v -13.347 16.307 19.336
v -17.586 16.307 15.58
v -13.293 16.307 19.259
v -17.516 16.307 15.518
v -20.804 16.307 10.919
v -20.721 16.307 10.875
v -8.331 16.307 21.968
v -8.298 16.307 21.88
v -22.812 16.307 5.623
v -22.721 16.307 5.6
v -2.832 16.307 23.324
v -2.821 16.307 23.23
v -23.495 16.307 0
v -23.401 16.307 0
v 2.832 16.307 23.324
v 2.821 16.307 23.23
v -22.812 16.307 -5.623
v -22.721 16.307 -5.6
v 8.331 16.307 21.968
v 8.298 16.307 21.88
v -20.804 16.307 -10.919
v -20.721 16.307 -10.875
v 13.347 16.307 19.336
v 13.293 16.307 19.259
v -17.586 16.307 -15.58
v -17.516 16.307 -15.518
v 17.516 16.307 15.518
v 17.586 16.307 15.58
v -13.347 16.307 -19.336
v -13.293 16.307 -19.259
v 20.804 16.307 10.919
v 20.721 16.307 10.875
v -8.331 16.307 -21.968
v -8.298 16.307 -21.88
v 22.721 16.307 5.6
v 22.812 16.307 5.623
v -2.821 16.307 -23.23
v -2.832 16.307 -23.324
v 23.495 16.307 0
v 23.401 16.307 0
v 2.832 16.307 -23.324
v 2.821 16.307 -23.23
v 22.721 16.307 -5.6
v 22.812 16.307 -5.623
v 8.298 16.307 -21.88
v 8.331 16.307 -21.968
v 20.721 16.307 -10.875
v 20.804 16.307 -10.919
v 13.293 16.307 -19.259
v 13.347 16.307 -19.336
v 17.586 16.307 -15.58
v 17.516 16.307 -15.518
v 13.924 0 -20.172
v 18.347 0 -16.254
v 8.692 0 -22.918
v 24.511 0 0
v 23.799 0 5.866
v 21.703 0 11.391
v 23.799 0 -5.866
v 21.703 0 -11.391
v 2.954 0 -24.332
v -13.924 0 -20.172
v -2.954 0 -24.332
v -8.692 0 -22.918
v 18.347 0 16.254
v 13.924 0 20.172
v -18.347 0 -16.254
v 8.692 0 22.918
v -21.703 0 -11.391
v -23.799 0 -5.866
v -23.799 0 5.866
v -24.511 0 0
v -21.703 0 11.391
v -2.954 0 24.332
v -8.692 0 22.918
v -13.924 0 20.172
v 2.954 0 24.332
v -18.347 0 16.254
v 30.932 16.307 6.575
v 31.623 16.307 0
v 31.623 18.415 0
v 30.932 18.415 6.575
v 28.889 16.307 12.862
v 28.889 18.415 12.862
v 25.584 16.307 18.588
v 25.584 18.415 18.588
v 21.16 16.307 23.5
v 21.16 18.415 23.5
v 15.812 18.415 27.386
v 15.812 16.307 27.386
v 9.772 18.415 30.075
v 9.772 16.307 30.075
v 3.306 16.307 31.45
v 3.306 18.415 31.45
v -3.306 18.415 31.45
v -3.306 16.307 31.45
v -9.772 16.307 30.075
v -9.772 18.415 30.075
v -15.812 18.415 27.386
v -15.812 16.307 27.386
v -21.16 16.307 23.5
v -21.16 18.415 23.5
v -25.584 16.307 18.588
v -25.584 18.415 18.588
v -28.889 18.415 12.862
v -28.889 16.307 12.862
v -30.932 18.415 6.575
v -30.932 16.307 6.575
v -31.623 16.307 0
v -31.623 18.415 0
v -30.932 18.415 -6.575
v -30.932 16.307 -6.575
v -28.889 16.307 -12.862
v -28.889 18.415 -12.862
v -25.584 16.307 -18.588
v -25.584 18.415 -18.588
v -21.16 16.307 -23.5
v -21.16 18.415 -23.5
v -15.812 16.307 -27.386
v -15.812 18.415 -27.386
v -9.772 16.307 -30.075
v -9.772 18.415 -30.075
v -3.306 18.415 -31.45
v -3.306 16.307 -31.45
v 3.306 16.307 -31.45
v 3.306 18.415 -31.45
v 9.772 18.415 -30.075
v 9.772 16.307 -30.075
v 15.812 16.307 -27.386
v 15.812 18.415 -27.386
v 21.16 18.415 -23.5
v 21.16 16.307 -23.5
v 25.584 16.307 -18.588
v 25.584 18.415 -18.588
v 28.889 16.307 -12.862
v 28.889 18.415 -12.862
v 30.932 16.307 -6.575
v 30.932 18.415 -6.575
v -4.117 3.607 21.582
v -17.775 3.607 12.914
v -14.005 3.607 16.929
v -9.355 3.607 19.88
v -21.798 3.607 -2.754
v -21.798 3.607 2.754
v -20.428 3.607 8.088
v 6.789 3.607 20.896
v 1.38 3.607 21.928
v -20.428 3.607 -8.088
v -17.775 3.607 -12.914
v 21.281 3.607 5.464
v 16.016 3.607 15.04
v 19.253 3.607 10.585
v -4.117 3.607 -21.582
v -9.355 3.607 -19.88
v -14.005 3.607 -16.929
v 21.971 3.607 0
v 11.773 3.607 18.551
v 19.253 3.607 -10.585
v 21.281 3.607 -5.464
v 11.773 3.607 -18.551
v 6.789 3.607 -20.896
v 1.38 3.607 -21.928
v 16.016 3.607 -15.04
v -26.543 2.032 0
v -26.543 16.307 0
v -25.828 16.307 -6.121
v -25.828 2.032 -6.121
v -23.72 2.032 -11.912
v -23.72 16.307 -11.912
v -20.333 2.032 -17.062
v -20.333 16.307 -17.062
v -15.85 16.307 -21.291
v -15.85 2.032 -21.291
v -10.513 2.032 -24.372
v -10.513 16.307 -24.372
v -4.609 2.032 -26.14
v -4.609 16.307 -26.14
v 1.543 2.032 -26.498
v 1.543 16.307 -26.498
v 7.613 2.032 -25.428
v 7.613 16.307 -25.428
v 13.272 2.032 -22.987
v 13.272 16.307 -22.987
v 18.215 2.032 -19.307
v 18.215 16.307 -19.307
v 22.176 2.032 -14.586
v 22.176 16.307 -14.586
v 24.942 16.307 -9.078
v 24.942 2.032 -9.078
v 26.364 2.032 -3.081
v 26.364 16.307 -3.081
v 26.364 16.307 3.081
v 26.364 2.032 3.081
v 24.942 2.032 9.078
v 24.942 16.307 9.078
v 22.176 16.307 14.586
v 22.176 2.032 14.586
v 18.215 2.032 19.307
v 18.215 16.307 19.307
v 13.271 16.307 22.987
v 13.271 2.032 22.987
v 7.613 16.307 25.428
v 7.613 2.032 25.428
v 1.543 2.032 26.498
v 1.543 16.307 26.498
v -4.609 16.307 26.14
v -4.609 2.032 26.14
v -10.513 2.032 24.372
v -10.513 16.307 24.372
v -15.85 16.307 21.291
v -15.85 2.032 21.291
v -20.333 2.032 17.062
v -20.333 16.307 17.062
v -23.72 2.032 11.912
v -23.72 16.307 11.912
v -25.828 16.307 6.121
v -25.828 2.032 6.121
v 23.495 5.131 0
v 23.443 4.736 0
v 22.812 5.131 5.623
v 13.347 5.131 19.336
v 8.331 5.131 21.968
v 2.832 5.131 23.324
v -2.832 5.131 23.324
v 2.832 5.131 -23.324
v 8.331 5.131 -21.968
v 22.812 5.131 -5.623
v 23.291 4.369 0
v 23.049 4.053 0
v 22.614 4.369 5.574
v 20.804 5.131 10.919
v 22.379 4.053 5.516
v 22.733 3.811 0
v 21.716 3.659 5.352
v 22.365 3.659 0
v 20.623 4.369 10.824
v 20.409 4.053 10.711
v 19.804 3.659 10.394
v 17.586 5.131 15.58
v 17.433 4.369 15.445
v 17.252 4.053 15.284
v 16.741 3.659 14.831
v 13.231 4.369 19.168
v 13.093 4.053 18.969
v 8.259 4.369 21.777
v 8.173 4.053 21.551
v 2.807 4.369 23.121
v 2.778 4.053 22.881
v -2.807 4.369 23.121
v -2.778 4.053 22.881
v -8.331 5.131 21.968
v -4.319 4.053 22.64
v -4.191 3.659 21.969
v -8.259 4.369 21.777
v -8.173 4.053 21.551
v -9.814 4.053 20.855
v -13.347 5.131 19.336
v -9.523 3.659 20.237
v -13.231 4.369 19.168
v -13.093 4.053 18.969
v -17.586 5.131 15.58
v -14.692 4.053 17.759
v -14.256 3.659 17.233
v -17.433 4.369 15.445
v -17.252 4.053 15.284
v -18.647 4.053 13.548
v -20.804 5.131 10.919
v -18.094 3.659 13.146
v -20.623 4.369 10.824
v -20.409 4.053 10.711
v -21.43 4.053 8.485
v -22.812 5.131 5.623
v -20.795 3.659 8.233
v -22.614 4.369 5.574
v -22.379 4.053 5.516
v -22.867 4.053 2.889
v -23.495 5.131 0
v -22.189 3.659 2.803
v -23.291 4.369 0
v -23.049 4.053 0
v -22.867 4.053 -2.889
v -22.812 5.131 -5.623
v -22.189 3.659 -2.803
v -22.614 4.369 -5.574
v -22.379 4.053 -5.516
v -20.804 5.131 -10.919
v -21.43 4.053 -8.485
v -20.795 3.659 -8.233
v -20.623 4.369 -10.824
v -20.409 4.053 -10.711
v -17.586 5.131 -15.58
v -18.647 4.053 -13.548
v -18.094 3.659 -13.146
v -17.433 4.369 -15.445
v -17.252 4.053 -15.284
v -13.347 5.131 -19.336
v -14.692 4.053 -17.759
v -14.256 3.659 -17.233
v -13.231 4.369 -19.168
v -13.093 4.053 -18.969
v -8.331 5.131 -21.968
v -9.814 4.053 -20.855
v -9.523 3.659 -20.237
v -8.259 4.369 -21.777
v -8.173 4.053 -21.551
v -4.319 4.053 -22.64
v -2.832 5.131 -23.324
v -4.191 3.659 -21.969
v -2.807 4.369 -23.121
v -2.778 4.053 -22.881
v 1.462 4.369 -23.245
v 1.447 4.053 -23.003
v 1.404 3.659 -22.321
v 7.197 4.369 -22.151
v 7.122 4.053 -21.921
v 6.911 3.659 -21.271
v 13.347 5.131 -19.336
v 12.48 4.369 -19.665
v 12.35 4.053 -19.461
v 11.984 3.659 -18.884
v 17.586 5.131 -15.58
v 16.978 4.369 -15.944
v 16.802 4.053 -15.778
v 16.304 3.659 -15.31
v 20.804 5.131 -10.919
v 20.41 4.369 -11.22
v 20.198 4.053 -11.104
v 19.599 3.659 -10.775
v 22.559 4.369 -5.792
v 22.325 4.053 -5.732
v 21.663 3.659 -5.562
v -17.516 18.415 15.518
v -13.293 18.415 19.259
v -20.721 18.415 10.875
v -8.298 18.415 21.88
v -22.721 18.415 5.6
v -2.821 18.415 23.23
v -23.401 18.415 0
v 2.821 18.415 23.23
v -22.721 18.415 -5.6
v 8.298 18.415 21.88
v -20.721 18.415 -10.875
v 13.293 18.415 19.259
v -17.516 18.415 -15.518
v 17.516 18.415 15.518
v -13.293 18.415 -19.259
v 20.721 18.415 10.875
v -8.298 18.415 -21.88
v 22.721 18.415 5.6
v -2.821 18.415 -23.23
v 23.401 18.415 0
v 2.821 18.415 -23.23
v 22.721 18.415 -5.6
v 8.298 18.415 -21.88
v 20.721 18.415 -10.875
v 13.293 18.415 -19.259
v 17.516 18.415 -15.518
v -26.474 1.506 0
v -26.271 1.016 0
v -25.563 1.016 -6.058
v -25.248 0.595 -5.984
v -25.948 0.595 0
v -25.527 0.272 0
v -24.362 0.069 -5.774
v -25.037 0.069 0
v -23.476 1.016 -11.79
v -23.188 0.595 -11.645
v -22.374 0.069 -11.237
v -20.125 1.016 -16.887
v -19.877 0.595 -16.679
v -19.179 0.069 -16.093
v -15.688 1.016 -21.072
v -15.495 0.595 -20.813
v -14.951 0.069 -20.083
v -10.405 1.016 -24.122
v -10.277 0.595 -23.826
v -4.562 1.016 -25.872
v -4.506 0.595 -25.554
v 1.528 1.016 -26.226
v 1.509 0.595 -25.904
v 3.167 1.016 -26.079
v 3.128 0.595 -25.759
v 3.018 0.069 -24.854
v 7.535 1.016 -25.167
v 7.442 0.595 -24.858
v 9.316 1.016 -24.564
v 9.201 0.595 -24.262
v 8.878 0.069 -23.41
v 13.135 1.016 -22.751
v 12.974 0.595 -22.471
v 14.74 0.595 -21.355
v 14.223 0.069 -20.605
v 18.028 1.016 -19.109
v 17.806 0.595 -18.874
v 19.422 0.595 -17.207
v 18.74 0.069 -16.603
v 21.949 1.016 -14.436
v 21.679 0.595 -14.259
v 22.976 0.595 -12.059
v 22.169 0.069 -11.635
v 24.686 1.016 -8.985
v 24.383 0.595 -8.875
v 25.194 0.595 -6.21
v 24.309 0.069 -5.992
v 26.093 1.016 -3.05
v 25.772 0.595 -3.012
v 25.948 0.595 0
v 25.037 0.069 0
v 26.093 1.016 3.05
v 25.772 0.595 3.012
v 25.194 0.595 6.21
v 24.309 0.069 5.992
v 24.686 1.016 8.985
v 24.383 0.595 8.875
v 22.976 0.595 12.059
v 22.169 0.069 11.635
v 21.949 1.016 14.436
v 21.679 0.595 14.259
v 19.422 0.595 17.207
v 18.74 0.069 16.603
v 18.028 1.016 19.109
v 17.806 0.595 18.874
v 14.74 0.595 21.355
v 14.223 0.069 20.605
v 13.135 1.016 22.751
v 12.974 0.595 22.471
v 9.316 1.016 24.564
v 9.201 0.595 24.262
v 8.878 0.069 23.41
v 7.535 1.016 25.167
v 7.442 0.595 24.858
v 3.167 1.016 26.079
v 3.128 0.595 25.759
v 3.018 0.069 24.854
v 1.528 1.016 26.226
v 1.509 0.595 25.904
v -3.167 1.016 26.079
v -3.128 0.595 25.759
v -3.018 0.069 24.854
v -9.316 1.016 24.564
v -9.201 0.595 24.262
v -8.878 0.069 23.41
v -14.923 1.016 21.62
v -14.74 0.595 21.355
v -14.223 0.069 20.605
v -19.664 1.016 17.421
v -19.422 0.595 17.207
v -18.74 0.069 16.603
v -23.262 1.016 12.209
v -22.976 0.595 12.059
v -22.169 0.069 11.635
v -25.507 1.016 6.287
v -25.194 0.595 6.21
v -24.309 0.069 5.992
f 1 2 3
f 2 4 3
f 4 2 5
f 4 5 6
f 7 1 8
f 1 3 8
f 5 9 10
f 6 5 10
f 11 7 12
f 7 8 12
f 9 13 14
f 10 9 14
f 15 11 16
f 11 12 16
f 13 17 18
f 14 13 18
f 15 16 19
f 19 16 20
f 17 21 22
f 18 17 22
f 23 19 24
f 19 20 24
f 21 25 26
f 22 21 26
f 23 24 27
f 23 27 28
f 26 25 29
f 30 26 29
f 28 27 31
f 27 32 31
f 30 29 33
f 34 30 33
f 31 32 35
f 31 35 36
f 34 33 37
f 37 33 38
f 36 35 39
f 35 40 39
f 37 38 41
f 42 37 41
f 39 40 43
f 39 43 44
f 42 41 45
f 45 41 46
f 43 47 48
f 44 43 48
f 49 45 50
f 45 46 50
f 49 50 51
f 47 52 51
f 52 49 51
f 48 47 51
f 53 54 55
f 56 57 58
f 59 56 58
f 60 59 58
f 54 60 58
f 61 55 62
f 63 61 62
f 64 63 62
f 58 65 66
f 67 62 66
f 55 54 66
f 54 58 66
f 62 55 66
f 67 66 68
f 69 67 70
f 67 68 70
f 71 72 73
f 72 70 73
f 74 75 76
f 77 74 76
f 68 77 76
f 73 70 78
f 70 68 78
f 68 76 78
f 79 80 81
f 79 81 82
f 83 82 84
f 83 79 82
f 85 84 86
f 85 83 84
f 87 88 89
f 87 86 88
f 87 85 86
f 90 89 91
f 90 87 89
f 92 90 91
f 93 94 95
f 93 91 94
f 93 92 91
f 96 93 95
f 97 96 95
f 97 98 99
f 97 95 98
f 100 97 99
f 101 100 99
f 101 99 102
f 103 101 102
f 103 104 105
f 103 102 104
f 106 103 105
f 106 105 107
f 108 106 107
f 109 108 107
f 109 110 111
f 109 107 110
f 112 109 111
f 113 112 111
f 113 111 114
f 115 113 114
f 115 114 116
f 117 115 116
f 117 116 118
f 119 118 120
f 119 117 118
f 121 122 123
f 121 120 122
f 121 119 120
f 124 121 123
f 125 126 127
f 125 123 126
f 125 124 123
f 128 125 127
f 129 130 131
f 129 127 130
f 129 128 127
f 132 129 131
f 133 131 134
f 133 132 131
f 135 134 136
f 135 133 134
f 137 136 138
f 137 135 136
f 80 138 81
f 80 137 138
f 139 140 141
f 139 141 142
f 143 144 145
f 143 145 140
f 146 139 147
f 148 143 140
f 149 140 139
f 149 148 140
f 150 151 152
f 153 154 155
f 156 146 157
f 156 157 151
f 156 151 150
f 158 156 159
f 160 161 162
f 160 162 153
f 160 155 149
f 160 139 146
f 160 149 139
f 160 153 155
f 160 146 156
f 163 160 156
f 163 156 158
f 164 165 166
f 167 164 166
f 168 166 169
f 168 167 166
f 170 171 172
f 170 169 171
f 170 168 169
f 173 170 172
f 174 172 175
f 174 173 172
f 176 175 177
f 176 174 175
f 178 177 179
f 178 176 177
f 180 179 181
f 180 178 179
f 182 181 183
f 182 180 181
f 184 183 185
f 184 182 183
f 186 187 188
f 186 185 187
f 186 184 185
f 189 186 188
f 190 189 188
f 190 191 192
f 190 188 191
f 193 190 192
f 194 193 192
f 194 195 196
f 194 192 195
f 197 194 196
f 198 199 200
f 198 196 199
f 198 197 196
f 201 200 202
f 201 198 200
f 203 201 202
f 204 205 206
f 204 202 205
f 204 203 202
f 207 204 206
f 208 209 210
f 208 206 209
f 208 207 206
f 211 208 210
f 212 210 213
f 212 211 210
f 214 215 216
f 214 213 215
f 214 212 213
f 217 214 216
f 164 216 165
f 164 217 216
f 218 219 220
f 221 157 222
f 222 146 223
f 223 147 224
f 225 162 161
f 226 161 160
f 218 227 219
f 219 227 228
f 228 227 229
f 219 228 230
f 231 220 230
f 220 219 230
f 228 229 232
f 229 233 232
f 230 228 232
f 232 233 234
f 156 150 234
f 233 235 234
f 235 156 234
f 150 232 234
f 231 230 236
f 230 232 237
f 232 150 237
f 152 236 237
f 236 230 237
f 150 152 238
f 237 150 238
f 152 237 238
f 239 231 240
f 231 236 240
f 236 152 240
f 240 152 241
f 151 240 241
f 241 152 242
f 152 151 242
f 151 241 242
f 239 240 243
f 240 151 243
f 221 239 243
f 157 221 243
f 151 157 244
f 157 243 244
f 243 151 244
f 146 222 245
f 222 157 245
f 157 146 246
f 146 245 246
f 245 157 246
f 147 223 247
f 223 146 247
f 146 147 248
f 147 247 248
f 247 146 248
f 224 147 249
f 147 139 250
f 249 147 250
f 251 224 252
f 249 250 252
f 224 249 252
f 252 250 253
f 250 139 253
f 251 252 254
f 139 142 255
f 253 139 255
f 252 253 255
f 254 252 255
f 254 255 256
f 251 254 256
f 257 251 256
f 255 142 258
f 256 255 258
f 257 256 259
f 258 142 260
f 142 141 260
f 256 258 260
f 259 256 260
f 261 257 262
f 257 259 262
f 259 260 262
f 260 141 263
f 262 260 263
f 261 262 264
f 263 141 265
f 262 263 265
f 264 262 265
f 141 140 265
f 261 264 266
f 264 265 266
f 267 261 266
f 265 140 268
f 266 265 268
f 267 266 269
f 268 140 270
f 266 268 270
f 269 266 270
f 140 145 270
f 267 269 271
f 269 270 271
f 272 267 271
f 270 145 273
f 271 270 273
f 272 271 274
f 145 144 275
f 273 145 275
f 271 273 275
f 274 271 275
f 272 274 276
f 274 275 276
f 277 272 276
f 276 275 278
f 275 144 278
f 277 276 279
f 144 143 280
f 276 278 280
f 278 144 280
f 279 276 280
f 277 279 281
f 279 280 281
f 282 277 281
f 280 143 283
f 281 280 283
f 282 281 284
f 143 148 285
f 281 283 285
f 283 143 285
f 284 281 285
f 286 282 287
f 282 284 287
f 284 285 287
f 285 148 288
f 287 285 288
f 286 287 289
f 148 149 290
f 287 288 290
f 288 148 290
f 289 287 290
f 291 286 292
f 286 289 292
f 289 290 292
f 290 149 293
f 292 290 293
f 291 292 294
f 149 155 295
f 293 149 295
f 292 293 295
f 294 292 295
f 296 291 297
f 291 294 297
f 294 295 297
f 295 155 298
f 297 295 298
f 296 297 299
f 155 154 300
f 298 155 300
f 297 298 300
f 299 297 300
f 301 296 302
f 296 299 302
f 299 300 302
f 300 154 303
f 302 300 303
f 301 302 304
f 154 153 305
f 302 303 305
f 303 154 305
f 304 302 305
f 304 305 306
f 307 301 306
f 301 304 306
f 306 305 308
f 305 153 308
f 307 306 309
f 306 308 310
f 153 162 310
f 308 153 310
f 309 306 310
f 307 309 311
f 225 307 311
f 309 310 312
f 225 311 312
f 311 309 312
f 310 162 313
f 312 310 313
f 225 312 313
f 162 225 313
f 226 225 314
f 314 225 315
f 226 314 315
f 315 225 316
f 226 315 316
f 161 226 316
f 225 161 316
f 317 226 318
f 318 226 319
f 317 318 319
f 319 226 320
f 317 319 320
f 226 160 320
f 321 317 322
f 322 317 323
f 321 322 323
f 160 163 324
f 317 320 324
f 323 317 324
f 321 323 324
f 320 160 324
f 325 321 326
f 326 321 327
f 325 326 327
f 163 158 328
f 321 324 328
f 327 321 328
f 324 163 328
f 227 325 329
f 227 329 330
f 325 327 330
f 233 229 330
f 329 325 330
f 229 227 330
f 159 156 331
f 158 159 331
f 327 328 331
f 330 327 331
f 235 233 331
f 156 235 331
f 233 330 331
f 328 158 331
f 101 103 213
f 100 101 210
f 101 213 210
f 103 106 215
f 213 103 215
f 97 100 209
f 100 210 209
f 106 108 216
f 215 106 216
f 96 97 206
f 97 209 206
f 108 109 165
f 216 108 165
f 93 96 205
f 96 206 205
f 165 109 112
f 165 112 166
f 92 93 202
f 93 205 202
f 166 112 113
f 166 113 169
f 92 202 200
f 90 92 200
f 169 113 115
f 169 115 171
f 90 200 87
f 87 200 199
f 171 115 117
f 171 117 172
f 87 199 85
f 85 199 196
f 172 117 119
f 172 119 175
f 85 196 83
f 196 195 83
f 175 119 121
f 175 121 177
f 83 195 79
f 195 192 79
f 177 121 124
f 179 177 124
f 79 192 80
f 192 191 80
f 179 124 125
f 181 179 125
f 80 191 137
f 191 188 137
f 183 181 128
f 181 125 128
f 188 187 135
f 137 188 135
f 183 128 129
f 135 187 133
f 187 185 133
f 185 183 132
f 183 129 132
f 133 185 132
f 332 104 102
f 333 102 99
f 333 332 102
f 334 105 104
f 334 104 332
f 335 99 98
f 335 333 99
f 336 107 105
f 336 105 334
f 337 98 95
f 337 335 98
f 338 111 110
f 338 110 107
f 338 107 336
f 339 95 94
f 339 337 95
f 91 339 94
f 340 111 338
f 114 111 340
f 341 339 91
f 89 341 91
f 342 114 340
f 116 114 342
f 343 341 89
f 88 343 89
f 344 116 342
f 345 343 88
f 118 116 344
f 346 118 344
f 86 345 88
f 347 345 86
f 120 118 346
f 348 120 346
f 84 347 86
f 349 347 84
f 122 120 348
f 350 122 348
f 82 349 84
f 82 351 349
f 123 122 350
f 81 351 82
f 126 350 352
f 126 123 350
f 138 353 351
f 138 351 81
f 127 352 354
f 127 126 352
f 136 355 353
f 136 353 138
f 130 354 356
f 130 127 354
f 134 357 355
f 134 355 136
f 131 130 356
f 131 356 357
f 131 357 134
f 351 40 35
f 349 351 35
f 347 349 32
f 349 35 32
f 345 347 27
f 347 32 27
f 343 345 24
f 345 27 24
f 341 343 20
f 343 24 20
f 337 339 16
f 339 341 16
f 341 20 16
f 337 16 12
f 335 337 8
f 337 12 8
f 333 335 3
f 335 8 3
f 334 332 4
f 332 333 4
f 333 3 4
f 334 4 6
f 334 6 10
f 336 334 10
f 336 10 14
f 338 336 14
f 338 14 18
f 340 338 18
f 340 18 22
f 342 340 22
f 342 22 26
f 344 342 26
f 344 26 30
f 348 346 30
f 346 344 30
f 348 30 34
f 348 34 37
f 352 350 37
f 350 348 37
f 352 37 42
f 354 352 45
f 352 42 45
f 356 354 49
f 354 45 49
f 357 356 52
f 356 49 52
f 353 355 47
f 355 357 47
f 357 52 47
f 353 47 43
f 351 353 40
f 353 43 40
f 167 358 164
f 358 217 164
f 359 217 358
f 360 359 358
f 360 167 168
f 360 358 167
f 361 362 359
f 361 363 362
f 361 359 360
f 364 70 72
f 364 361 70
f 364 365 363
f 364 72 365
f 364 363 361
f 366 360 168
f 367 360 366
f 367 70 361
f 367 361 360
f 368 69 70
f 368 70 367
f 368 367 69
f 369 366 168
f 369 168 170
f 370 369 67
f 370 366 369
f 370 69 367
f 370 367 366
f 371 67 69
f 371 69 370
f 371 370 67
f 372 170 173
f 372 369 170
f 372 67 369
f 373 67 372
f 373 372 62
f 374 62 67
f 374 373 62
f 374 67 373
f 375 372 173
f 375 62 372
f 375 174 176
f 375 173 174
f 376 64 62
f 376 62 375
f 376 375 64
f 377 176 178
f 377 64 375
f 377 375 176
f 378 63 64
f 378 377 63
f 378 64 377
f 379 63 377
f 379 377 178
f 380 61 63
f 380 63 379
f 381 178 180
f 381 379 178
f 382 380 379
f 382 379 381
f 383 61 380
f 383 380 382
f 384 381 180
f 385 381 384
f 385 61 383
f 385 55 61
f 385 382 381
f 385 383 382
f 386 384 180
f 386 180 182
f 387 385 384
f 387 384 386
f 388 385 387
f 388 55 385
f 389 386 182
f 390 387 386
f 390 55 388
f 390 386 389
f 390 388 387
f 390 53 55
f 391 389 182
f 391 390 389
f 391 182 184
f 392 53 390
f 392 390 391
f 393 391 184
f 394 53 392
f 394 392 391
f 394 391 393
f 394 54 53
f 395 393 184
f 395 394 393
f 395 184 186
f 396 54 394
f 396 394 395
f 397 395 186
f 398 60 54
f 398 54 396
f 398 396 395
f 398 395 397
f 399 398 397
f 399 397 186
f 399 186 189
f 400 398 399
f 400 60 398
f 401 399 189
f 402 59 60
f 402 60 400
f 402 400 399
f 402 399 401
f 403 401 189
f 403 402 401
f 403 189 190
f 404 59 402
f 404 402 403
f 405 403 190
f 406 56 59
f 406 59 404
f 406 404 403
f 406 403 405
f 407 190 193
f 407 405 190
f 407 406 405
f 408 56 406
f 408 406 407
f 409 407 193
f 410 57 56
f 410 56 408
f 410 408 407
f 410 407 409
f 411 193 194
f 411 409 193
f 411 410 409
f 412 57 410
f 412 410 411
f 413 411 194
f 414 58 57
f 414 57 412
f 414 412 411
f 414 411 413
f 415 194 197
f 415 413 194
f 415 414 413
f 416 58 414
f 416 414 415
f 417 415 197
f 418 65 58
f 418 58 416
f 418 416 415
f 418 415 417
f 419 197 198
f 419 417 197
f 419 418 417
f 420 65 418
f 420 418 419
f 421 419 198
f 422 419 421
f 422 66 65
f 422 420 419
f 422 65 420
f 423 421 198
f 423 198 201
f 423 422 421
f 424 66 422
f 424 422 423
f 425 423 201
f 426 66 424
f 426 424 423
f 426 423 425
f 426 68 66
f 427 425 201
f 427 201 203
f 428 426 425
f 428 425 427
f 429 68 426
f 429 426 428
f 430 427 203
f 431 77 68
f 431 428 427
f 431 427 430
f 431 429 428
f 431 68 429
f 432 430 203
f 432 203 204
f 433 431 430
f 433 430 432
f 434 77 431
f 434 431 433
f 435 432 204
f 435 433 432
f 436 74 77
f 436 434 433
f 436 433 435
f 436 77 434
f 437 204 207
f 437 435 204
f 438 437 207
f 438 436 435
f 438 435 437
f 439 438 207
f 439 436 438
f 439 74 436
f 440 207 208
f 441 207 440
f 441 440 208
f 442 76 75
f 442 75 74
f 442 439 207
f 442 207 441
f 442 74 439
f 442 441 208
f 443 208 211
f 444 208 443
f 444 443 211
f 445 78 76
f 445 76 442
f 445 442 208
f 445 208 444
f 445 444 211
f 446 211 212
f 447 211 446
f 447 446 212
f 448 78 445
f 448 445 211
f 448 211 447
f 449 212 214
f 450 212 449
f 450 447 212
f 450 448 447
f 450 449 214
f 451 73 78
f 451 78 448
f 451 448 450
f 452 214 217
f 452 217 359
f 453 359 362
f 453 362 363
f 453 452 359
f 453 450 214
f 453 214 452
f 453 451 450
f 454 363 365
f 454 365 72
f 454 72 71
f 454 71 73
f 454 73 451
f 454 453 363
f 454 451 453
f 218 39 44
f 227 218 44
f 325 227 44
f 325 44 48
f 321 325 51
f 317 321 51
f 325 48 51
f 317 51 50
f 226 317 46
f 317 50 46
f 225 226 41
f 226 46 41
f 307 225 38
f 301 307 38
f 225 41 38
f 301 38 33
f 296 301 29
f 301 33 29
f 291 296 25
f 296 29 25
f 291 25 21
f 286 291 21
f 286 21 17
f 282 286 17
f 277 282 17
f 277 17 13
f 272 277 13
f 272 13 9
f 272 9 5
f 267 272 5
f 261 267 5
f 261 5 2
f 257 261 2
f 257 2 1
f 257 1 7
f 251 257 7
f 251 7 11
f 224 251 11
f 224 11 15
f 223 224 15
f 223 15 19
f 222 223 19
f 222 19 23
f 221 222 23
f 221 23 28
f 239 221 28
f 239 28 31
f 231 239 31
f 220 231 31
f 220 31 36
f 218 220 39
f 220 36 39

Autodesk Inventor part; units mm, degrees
ref_plane "YZ Plane" through (0, 0, 0) normal (1, 0, 0) x (0, 1, 0)
ref_plane "XZ Plane" through (0, 0, 0) normal (0, 1, 0) x (-1, 0, 0)
ref_plane "XY Plane" through (0, 0, 0) normal (0, 0, 1) x (1, 0, 0)
sketch "Sketch1" plane through (0, 0, 0) normal (0, 1, 0) x (-1, 0, 0)
  circle A0 centre (0, 0) radius 26.543
  dimension "d0" = 53.086
extrude "Extrusion1" add sketch "Sketch1" along normal blind 16.3068
sketch "Sketch2" plane through (0, 16.3068, 0) normal (0, 1, 0) x (1, 0, 0)
  circle A0 centre (0, 0) radius 23.495
  dimension "d3" = 46.99
extrude "Extrusion2" cut sketch "Sketch2" against normal blind 12.7
sketch "Sketch3" plane through (0, 16.3068, 0) normal (0, 1, 0) x (1, 0, 0)
  circle A0 centre (0, 0) radius 31.623
  circle A1 centre (0, 0) radius 23.401
  dimension "d6" = 63.246
extrude "Extrusion4" add sketch "Sketch3" along normal blind 2.1082
fillet "Fillet1" radius 2.032 1 edges at (26.543, 0, 0)
fillet "Fillet2" radius 1.524 1 edges at (-23.495, 3.6068, 0)
properties part number "_3DPrint"
